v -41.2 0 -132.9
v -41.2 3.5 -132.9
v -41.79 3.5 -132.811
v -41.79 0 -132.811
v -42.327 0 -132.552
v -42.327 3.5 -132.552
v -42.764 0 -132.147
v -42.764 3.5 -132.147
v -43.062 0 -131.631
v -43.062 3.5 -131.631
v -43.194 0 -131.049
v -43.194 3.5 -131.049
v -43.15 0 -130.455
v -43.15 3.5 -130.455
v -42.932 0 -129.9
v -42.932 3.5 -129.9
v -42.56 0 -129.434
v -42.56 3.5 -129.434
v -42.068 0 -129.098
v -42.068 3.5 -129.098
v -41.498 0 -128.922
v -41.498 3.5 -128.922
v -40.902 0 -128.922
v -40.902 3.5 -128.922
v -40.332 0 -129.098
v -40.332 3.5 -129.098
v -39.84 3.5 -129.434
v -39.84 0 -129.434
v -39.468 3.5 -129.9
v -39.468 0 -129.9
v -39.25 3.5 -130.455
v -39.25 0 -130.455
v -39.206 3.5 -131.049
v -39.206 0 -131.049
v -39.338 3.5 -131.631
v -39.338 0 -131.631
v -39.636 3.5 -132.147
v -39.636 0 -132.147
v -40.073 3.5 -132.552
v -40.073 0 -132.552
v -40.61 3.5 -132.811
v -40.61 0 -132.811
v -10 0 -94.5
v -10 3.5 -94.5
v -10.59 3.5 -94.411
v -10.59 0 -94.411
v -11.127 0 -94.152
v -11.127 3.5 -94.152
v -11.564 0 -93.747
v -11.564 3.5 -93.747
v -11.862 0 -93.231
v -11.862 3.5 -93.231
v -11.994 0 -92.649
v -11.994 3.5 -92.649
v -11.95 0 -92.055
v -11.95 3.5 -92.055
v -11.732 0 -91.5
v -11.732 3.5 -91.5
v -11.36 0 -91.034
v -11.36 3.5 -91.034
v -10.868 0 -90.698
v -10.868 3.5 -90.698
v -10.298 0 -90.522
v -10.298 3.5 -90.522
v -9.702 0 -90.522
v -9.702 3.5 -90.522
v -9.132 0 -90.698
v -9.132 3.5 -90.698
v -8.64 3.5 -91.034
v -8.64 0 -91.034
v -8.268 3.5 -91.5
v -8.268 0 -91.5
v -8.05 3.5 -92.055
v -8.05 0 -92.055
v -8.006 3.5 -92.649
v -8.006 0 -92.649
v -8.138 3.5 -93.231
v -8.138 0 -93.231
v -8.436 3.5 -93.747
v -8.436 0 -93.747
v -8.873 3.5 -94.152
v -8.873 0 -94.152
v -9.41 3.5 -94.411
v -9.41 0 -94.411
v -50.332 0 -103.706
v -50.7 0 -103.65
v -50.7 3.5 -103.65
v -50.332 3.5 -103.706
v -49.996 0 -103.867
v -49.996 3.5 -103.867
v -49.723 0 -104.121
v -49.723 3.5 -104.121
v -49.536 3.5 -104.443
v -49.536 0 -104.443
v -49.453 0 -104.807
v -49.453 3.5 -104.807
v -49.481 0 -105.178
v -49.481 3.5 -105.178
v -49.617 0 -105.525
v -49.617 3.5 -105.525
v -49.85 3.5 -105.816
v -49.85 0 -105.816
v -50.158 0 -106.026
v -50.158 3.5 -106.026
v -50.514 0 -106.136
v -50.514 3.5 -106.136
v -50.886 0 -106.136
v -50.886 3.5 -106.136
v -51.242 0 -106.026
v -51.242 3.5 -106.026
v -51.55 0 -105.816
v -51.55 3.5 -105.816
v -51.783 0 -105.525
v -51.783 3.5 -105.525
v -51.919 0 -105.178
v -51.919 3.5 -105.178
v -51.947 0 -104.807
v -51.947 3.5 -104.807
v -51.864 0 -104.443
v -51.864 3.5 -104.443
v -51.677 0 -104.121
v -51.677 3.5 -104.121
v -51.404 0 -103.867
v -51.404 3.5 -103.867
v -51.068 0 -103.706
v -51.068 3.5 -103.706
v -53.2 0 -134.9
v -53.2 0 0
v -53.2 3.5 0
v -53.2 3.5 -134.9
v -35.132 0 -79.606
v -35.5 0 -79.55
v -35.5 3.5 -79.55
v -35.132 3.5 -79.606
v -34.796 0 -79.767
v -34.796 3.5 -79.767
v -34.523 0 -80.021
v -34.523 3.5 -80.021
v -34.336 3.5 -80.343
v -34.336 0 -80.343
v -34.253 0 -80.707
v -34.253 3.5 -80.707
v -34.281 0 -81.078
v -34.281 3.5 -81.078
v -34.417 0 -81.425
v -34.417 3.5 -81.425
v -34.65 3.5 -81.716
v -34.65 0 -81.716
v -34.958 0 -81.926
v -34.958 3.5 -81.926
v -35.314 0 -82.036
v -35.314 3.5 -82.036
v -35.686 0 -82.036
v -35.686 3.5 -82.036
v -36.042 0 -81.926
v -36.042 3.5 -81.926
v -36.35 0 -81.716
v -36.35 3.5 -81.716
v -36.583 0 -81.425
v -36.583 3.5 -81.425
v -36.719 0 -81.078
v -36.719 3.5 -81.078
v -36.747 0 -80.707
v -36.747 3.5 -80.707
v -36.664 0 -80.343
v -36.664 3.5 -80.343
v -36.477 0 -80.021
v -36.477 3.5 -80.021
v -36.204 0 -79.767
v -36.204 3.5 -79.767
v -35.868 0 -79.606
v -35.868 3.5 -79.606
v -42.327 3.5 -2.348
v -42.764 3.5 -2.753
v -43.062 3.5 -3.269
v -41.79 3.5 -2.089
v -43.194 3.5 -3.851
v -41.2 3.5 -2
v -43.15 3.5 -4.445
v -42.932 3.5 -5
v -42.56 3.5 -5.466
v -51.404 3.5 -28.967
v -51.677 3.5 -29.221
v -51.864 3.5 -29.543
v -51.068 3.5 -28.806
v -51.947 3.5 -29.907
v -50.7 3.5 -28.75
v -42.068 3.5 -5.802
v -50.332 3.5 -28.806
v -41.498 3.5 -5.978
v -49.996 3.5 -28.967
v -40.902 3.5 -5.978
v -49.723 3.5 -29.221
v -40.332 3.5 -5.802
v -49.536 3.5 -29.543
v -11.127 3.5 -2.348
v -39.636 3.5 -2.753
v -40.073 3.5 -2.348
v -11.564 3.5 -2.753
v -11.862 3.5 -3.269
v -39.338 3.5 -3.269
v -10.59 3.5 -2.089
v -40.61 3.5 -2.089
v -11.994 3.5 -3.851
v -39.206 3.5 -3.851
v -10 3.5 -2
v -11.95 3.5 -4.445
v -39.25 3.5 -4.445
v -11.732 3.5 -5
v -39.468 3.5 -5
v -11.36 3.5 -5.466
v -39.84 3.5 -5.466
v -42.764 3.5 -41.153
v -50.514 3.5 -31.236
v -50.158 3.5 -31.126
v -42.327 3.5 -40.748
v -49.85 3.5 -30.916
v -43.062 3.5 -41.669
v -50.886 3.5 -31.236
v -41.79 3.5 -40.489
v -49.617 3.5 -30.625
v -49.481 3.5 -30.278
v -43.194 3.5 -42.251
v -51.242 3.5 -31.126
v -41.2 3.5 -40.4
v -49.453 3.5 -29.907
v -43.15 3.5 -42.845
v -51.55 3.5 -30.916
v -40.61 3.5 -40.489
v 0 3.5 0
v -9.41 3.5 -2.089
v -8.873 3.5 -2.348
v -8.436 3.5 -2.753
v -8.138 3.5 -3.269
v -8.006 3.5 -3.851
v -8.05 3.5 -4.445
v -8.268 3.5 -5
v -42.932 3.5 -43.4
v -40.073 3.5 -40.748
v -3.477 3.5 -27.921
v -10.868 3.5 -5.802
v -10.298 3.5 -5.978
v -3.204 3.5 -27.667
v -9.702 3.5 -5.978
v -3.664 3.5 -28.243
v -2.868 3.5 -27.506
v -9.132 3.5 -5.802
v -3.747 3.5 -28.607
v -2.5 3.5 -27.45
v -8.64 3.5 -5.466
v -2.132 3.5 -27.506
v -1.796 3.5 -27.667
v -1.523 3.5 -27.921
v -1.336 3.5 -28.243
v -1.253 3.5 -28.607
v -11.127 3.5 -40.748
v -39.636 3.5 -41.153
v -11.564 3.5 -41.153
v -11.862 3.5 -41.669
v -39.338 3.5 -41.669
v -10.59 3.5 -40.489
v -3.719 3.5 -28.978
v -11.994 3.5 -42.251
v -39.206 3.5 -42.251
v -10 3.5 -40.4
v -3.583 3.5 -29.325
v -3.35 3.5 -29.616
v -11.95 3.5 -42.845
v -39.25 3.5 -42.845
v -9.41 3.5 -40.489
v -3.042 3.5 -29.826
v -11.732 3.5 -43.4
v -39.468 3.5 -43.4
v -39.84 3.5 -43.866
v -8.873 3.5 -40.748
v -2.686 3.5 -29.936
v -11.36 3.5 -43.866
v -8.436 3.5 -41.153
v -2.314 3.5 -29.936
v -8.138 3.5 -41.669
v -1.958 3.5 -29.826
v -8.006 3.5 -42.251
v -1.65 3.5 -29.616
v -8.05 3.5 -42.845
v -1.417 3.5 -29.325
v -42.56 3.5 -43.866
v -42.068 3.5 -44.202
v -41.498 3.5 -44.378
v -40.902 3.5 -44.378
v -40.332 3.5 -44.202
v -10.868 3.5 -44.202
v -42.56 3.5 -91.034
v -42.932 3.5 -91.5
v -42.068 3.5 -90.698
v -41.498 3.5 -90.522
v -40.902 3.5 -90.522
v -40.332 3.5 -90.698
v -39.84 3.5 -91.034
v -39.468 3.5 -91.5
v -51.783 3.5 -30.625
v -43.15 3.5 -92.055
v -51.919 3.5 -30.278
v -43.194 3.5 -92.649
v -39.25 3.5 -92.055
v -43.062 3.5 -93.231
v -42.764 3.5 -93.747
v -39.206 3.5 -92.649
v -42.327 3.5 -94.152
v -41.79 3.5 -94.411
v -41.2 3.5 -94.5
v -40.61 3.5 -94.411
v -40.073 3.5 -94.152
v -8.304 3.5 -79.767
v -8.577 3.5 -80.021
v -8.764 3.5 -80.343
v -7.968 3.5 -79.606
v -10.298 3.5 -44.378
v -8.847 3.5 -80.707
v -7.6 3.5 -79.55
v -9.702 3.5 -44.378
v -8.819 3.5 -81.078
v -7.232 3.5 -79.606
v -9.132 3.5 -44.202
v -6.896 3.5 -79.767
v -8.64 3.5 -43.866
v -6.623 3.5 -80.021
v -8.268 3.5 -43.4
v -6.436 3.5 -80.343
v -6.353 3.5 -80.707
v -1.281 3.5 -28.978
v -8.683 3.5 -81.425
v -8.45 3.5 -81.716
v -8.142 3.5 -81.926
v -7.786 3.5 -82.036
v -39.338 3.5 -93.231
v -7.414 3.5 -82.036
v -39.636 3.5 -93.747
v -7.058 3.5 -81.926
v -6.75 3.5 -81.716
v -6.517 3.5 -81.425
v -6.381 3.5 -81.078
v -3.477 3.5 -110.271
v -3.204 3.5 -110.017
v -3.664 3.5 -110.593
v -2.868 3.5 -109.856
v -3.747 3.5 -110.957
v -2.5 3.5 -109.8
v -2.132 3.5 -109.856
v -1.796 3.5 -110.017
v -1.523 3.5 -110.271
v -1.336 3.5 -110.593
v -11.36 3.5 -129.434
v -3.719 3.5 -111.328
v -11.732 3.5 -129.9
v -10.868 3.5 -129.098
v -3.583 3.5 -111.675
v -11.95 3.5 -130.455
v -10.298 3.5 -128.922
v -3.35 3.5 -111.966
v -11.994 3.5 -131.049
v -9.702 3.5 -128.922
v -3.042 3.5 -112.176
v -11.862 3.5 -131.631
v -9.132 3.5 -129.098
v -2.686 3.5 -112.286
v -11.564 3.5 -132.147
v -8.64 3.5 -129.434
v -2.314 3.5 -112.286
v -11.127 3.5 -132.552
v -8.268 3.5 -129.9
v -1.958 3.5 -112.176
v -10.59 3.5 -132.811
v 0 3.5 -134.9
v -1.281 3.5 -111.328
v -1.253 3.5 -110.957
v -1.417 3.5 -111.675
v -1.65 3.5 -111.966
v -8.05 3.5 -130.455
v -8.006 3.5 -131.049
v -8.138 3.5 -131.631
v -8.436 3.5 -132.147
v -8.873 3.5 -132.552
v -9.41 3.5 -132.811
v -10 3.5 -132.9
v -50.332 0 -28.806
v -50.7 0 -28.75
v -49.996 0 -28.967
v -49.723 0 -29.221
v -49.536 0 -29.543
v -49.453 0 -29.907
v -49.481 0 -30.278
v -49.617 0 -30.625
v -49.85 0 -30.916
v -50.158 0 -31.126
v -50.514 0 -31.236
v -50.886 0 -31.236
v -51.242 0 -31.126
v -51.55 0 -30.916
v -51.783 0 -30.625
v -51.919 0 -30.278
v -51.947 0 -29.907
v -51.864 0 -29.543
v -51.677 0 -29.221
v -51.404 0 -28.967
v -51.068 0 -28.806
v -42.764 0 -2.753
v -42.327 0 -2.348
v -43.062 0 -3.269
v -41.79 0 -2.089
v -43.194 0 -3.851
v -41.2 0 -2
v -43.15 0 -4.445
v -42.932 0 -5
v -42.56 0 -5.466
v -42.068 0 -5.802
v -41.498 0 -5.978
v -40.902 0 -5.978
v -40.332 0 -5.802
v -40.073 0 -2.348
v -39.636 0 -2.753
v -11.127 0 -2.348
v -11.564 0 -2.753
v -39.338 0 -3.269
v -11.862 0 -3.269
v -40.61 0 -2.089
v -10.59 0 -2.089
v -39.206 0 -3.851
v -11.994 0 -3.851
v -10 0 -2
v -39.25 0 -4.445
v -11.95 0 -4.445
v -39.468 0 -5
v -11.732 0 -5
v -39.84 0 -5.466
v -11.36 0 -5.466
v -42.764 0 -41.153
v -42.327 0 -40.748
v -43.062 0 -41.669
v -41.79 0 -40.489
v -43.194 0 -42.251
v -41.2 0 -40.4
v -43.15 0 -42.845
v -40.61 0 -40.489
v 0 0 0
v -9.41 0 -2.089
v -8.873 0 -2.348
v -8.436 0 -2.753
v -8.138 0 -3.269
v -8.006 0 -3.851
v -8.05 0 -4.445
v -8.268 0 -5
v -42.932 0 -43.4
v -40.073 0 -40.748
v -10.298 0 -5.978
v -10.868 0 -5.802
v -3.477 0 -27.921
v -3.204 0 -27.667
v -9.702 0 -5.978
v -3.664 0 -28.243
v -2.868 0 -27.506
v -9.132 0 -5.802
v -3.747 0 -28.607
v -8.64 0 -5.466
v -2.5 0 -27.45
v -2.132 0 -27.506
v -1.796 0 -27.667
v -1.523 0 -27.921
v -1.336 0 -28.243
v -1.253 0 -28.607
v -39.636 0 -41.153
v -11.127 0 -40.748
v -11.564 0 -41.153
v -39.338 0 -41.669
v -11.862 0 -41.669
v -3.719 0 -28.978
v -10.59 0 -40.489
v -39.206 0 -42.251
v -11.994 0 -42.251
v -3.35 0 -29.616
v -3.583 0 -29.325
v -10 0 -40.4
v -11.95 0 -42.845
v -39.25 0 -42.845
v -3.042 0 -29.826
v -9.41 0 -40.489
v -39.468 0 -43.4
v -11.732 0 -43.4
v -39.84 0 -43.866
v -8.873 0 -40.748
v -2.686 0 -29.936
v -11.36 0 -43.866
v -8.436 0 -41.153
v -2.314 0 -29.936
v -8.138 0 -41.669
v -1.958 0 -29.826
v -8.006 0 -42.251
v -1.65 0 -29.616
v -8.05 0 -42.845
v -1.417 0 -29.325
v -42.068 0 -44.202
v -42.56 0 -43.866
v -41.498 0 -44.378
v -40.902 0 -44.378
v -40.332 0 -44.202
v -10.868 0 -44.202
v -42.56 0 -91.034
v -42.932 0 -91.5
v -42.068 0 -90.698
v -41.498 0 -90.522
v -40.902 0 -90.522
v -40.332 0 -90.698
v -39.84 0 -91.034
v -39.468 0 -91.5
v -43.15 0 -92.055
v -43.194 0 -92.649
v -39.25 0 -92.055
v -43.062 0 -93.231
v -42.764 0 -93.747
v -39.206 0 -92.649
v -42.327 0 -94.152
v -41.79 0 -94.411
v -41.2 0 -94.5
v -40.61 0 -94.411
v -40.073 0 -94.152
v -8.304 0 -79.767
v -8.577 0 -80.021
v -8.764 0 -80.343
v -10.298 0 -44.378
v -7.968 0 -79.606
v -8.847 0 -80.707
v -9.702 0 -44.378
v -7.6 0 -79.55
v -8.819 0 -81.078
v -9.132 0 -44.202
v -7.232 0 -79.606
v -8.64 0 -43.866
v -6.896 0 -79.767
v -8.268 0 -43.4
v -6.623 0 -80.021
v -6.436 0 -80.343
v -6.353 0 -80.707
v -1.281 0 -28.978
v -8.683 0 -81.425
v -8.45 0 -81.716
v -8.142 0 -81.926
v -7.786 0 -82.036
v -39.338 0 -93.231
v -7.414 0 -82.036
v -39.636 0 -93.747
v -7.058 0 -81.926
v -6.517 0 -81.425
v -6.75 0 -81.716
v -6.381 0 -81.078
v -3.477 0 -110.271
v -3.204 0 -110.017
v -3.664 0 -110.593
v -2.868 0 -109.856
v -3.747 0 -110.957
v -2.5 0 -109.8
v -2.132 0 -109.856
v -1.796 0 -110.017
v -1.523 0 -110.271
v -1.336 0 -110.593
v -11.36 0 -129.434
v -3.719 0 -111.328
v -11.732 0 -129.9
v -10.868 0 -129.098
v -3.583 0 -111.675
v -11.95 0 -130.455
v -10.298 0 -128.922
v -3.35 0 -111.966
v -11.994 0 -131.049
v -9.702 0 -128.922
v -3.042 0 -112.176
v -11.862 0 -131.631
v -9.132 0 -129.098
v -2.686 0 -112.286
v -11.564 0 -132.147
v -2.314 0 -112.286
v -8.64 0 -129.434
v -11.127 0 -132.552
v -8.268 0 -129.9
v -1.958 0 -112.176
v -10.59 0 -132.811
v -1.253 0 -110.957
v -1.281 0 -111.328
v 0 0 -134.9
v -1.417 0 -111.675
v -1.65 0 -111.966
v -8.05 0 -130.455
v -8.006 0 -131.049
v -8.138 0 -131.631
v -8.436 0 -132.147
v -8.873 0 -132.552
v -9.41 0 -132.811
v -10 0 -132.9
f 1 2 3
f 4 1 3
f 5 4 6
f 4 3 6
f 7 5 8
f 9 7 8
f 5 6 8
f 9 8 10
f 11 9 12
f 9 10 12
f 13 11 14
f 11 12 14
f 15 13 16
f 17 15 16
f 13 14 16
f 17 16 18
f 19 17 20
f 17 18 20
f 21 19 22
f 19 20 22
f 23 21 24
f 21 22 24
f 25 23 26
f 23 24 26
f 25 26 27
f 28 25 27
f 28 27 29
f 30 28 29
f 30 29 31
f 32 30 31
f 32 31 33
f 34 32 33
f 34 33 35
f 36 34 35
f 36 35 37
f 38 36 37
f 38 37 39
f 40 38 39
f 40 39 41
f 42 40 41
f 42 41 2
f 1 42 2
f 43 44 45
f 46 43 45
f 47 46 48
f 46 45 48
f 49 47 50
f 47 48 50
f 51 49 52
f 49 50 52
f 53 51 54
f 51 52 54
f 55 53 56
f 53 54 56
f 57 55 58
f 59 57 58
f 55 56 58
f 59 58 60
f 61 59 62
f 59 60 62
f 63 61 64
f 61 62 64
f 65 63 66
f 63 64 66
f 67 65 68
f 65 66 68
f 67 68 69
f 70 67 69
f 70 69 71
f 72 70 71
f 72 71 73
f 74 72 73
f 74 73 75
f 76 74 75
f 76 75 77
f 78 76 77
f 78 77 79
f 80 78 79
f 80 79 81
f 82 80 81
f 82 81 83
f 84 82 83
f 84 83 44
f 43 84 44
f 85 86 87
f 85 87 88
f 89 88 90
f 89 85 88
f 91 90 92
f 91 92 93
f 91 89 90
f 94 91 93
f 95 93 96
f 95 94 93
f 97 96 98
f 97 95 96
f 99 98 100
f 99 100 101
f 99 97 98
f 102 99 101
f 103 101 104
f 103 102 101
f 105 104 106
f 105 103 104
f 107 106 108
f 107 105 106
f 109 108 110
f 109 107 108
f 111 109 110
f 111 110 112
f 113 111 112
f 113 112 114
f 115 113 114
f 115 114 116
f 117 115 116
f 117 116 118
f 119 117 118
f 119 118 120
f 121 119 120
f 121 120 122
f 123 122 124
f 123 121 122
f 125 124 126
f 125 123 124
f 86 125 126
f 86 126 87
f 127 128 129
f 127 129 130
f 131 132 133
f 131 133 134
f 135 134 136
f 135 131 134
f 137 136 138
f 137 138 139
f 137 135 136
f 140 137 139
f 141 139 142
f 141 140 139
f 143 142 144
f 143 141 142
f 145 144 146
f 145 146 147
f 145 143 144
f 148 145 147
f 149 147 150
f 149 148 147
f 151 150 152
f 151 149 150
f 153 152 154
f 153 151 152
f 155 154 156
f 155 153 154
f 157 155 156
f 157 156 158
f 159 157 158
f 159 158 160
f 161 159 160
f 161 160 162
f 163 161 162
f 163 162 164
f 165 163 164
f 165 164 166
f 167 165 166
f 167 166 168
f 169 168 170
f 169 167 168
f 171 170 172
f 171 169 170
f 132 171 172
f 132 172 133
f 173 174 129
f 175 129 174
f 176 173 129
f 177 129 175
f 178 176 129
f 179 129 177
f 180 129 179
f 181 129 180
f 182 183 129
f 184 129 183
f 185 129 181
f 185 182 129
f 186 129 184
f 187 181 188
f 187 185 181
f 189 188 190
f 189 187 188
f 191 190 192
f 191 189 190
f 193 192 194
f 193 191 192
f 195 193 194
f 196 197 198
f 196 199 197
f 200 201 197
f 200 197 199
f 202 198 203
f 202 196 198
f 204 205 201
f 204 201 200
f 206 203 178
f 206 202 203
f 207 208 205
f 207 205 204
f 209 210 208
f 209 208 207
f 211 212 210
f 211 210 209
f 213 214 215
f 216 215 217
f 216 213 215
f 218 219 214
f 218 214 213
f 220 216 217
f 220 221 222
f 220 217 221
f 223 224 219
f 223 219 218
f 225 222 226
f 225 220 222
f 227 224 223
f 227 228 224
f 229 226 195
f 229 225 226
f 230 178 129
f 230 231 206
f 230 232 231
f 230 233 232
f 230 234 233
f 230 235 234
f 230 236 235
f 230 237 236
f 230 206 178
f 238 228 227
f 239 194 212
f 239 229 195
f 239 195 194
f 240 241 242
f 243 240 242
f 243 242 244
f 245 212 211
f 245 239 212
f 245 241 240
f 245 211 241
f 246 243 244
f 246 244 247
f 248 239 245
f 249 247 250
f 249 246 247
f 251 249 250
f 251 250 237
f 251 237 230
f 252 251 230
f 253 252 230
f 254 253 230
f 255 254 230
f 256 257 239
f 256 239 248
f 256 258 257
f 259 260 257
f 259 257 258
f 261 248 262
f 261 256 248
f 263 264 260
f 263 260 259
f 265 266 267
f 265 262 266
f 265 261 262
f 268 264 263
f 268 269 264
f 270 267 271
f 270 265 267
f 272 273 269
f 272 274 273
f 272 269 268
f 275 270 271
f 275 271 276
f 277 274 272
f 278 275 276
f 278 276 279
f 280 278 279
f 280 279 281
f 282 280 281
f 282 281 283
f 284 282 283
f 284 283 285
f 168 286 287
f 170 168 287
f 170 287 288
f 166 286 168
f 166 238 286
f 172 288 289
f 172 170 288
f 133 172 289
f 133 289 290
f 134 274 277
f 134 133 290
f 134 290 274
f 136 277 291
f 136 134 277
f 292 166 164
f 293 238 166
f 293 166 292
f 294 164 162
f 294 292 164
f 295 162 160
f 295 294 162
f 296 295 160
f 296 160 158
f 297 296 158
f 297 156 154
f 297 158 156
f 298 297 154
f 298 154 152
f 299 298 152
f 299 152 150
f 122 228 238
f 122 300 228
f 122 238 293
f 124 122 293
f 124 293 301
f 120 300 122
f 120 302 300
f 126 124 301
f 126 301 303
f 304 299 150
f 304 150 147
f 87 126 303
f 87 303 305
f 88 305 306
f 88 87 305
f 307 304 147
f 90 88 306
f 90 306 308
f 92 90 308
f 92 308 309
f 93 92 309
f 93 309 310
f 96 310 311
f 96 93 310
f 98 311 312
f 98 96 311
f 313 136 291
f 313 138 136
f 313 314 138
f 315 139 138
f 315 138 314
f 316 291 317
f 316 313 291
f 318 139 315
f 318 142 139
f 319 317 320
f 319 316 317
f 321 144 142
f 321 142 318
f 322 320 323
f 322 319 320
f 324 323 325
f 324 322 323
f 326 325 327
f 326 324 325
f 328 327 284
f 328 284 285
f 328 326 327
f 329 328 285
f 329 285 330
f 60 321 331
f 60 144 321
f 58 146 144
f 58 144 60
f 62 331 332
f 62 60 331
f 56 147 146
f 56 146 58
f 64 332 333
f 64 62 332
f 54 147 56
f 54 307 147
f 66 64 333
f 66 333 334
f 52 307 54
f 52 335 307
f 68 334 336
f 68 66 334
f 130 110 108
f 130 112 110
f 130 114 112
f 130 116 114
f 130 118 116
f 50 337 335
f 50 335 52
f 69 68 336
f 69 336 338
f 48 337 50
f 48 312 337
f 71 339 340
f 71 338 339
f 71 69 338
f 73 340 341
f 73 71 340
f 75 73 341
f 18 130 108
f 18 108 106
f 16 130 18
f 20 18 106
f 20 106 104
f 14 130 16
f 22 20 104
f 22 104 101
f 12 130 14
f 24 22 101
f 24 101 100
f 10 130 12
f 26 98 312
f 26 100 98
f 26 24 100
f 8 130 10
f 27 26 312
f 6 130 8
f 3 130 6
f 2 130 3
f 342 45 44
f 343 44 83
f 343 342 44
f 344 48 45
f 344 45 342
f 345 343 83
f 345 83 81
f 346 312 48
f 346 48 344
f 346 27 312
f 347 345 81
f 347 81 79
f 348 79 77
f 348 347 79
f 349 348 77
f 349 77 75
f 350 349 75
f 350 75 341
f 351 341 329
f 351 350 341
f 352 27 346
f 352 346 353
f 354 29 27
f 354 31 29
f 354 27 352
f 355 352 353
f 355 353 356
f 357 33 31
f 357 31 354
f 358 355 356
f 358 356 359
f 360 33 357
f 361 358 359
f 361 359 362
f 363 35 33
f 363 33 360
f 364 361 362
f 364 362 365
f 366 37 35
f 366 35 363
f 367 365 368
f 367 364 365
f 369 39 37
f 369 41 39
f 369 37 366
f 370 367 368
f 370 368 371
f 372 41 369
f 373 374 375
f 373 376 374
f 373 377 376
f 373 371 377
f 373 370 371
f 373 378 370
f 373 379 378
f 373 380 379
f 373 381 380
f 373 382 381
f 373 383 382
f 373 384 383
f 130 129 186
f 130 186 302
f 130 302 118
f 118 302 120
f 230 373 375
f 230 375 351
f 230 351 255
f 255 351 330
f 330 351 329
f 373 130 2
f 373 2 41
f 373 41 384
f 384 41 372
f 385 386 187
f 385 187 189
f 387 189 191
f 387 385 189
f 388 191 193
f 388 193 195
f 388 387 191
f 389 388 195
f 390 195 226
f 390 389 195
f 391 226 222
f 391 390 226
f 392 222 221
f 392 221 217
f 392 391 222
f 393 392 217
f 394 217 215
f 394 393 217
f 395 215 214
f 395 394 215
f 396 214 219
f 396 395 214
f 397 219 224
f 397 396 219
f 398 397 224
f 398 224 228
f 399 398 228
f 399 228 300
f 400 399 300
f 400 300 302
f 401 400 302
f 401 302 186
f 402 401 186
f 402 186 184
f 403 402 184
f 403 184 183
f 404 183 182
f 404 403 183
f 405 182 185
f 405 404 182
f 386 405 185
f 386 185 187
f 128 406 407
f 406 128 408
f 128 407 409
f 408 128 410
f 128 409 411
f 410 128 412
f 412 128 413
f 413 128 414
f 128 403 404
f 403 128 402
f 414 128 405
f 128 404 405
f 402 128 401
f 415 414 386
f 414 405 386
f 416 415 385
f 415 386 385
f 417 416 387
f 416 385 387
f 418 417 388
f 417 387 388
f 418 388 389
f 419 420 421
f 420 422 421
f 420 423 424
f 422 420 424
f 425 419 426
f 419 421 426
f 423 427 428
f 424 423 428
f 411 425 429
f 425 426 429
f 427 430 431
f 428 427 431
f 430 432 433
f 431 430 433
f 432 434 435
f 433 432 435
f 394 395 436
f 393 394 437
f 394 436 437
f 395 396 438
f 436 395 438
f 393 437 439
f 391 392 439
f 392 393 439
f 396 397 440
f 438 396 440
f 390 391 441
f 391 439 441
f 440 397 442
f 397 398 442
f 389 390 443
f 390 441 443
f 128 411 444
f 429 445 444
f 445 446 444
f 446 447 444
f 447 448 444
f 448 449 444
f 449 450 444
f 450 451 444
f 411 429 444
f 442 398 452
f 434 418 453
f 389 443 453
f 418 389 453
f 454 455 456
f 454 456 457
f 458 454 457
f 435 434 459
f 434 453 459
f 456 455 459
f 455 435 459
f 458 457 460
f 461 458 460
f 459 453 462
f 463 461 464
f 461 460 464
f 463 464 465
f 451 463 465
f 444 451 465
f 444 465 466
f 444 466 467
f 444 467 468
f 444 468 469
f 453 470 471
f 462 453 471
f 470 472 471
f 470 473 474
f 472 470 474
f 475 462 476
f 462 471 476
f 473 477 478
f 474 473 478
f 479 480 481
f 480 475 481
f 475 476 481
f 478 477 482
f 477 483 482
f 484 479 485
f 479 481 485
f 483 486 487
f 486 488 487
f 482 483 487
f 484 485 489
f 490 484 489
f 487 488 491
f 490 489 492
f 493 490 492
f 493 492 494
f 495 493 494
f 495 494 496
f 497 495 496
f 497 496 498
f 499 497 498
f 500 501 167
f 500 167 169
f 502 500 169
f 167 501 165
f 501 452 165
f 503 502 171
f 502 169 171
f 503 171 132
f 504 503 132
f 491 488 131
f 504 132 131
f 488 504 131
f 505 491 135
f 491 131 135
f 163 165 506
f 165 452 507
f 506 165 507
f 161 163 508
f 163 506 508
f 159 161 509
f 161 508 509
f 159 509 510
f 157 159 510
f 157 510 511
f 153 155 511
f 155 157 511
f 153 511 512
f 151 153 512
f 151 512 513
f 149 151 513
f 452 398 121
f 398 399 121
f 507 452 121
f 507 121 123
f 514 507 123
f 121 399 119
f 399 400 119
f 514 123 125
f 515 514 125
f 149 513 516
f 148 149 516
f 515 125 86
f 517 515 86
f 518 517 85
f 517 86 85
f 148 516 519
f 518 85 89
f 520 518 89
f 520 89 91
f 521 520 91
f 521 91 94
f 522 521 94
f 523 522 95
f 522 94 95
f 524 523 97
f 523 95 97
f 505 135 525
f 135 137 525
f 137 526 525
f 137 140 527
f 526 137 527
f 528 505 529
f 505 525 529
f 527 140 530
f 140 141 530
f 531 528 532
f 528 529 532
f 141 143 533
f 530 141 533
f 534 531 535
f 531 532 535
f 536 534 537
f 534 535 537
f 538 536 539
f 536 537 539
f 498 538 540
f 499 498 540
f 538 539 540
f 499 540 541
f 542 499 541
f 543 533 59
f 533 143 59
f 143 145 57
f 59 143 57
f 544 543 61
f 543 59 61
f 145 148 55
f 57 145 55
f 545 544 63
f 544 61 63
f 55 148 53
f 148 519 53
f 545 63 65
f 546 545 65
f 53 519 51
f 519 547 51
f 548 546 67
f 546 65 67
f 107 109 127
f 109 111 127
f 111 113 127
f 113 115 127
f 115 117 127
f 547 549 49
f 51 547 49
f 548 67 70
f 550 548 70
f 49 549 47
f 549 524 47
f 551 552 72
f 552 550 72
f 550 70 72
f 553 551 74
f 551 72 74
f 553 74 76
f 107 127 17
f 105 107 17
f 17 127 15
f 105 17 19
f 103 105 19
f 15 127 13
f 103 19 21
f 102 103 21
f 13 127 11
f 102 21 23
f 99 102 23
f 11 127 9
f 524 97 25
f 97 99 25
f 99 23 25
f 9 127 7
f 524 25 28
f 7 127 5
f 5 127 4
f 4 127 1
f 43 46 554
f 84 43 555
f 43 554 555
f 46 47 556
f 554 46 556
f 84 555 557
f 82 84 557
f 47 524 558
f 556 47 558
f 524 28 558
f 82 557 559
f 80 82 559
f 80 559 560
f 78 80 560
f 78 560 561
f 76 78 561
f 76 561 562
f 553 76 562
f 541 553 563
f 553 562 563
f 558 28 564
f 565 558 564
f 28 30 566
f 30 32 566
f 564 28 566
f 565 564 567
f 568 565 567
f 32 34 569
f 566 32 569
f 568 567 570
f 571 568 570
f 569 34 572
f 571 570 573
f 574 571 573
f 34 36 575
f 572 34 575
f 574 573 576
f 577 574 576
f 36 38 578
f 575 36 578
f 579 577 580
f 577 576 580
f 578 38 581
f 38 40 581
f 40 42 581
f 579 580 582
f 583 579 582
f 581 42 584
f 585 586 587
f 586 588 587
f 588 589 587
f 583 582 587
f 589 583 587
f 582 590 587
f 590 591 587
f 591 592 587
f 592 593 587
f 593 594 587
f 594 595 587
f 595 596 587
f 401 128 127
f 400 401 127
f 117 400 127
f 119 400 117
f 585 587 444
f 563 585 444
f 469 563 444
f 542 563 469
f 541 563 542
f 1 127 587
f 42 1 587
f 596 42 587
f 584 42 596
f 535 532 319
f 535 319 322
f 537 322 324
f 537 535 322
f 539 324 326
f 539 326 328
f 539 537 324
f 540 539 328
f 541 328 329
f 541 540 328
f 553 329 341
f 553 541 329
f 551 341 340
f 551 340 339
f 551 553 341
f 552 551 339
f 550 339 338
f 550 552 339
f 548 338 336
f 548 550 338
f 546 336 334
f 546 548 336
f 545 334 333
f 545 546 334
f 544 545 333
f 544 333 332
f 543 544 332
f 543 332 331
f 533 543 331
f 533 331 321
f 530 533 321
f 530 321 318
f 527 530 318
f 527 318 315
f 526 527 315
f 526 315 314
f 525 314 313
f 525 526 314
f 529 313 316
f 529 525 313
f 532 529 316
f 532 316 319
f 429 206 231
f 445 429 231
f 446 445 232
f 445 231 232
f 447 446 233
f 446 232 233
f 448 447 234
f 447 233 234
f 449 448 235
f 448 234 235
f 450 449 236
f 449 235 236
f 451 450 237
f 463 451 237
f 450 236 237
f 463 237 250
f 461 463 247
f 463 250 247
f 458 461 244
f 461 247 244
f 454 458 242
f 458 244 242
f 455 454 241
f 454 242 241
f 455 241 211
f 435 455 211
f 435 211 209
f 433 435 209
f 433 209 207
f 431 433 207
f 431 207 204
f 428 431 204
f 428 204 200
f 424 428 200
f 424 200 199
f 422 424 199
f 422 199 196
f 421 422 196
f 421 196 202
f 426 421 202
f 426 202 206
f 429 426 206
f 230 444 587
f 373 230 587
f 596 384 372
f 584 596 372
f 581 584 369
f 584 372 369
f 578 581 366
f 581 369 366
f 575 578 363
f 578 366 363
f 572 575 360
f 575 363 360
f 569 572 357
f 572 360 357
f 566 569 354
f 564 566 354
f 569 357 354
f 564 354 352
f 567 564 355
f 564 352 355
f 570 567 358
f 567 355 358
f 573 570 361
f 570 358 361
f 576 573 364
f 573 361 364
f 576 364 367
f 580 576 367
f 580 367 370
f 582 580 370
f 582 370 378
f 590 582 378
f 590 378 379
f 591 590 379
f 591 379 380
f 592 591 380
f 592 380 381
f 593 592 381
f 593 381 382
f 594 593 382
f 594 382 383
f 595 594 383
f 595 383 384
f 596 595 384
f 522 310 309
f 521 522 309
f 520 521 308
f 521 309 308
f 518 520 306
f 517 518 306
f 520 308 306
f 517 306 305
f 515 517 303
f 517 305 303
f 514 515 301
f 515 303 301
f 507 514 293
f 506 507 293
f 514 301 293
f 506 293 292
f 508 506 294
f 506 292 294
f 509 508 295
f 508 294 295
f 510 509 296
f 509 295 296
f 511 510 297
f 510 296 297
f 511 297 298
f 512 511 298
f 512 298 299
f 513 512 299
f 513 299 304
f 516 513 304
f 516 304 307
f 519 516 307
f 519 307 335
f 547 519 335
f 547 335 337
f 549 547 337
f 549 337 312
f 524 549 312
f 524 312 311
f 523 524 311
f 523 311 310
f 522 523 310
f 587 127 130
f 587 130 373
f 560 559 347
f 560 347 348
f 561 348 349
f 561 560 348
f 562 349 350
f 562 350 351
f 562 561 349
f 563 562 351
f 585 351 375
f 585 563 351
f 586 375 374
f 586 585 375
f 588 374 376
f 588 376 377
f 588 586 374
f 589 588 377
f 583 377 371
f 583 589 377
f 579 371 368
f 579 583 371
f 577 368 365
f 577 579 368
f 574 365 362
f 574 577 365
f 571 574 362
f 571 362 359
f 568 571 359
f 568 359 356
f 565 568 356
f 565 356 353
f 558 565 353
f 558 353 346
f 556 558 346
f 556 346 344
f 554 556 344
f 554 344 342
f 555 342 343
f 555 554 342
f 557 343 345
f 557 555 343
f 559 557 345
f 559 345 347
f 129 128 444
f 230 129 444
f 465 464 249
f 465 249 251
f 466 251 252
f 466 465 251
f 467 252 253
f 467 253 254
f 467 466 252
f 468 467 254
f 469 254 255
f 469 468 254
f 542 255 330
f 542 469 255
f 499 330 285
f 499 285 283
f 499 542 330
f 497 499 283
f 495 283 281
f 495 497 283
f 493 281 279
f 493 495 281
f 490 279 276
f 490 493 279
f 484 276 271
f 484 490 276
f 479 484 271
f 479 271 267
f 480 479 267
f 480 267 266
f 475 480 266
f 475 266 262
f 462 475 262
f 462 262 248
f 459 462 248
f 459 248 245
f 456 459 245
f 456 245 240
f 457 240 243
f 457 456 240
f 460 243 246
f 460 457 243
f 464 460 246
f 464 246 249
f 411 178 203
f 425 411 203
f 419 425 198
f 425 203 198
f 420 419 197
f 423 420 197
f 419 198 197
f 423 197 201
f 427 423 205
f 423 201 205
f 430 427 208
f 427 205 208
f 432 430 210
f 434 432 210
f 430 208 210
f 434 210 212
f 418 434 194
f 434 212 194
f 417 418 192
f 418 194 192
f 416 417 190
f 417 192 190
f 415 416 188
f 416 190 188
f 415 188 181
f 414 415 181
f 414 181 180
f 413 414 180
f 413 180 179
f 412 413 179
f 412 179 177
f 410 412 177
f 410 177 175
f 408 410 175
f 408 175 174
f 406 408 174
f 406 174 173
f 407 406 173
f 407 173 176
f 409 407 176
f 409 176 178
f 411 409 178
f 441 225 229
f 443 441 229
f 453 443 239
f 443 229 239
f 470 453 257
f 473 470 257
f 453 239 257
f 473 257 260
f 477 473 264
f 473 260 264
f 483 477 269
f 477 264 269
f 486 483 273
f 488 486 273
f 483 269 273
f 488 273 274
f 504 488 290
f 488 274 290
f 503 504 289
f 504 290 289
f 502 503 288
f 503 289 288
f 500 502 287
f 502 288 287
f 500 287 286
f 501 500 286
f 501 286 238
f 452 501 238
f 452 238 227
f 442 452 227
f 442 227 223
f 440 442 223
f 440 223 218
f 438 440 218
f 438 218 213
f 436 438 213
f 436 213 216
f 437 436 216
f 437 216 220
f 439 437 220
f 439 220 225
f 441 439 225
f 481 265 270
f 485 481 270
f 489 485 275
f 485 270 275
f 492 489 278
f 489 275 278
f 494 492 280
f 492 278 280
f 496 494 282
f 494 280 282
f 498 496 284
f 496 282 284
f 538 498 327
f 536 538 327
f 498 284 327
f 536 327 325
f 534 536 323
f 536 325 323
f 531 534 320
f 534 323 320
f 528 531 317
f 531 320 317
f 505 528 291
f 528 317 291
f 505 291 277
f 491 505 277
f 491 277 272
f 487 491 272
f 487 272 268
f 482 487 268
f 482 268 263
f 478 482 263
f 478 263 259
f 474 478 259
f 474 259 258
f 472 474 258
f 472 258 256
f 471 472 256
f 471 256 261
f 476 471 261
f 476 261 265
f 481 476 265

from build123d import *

# Parameters (mm, degrees)
SKETCH1_W                                = 53.2
SKETCH1_H                                = 134.9
SKETCH1_R                                = 1.25
BOSS_EXTRUDE1_DEPTH                      = 3.5
POLOLU_MOUNTING_BRACKET_R                = 2
POLOLU_37MM_MOUNTING_BRACKET_HOLES_DEPTH = 146.053438429


with BuildPart() as part:
    # Sketch1 → Boss-Extrude1 (new body)
    with BuildSketch(Plane(origin=(0, 0, 0), x_dir=(1, 0, 0), z_dir=(0, 1, 0))):
        with Locations((-26.6, 67.45)):
            Rectangle(SKETCH1_W, SKETCH1_H)
        with Locations(Location((-50.7, 104.9, 0), (0, 0, 270))):
            Circle(SKETCH1_R, mode=Mode.SUBTRACT)
        with Locations(Location((-2.5, 111.05, 0), (0, 0, 270))):
            Circle(SKETCH1_R, mode=Mode.SUBTRACT)
        with Locations(Location((-35.5, 80.8, 0), (0, 0, 270))):
            Circle(SKETCH1_R, mode=Mode.SUBTRACT)
        with Locations(Location((-7.6, 80.8, 0), (0, 0, 270))):
            Circle(SKETCH1_R, mode=Mode.SUBTRACT)
        with Locations(Location((-50.7, 30, 0), (0, 0, 270))):
            Circle(SKETCH1_R, mode=Mode.SUBTRACT)
        with Locations(Location((-2.5, 28.7, 0), (0, 0, 270))):
            Circle(SKETCH1_R, mode=Mode.SUBTRACT)
    extrude(amount=BOSS_EXTRUDE1_DEPTH)

    # Pololu Mounting Bracket → Pololu 37mm mounting bracket holes (cut, through all)
    with BuildSketch(Plane(origin=(0, 3.5, 0), x_dir=(1, 0, 0), z_dir=(0, 1, 0))):
        with Locations(Location((-41.2, 4, 0), (0, 0, 270))):
            Circle(POLOLU_MOUNTING_BRACKET_R)
        with Locations(Location((-10, 4, 0), (0, 0, 270))):
            Circle(POLOLU_MOUNTING_BRACKET_R)
        with Locations(Location((-41.2, 42.4, 0), (0, 0, 270))):
            Circle(POLOLU_MOUNTING_BRACKET_R)
        with Locations(Location((-10, 42.4, 0), (0, 0, 270))):
            Circle(POLOLU_MOUNTING_BRACKET_R)
        with Locations(Location((-41.2, 130.9, 0), (0, 0, 90))):
            Circle(POLOLU_MOUNTING_BRACKET_R)
        with Locations(Location((-10, 130.9, 0), (0, 0, 90))):
            Circle(POLOLU_MOUNTING_BRACKET_R)
        with Locations(Location((-10, 92.5, 0), (0, 0, 90))):
            Circle(POLOLU_MOUNTING_BRACKET_R)
        with Locations(Location((-41.2, 92.5, 0), (0, 0, 90))):
            Circle(POLOLU_MOUNTING_BRACKET_R)
    extrude(amount=-POLOLU_37MM_MOUNTING_BRACKET_HOLES_DEPTH, mode=Mode.SUBTRACT)


solid = part.part
